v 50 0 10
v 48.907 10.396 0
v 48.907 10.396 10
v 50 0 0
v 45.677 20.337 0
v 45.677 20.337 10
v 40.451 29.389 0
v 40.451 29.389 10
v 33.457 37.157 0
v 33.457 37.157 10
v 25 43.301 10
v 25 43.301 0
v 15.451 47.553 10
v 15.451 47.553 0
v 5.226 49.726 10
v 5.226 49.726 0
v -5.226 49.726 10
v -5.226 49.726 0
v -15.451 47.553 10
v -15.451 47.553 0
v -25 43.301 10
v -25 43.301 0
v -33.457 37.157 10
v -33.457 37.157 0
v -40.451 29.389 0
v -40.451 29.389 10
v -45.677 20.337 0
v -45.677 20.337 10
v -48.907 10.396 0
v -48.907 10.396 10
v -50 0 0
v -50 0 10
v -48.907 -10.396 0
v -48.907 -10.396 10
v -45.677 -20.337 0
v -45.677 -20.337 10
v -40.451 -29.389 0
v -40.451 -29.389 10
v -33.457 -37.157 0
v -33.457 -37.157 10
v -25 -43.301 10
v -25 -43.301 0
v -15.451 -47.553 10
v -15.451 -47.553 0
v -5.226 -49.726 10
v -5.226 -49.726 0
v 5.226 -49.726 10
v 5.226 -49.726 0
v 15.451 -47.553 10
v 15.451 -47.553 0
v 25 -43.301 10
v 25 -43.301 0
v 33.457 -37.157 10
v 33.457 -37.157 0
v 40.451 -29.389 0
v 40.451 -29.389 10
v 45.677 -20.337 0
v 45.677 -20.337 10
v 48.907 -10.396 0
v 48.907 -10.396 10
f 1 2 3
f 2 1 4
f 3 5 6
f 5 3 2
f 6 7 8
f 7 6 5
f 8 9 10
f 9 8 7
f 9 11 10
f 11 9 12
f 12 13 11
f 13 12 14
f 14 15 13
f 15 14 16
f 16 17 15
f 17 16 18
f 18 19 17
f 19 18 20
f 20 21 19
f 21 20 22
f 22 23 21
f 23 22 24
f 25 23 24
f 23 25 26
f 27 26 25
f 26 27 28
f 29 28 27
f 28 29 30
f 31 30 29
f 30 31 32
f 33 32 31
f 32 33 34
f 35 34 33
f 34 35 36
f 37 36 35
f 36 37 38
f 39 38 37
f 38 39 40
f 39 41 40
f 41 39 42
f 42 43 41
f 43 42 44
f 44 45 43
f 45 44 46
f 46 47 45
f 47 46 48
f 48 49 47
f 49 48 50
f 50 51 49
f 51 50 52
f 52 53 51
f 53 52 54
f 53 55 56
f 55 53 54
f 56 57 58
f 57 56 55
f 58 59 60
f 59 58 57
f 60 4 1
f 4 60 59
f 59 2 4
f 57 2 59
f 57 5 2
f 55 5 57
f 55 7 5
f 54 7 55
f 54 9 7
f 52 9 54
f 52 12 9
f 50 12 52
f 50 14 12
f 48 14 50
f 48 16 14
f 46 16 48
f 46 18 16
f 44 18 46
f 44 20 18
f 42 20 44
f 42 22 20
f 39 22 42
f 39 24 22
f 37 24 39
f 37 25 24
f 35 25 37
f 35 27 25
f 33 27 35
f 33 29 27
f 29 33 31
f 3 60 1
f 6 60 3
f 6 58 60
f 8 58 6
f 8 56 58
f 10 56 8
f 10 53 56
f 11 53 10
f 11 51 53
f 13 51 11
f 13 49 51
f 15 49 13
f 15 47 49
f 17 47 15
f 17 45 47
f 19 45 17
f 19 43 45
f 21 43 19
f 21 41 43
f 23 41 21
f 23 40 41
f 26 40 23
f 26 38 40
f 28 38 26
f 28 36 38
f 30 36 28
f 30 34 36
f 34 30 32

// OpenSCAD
//CUSTOMIZER VARIABLES

//	This section is displays the disk options
//	Diameter of disk
Diameter = 100;	

//	Thickness of the disk
Thickness = 10;	

//	Hole in the disk
Hole_disk = "no"; // [yes,no]	

//	Diameter of the hole in the disk
Diameter_hole = 25;


if (Hole_disk=="yes")
{
    difference() {
 	cylinder(h = Thickness, r=Diameter/2);
	cylinder(h = Thickness, r=Diameter_hole/2);
 	}
} else {
    cylinder(h = Thickness, r=Diameter/2);
}
